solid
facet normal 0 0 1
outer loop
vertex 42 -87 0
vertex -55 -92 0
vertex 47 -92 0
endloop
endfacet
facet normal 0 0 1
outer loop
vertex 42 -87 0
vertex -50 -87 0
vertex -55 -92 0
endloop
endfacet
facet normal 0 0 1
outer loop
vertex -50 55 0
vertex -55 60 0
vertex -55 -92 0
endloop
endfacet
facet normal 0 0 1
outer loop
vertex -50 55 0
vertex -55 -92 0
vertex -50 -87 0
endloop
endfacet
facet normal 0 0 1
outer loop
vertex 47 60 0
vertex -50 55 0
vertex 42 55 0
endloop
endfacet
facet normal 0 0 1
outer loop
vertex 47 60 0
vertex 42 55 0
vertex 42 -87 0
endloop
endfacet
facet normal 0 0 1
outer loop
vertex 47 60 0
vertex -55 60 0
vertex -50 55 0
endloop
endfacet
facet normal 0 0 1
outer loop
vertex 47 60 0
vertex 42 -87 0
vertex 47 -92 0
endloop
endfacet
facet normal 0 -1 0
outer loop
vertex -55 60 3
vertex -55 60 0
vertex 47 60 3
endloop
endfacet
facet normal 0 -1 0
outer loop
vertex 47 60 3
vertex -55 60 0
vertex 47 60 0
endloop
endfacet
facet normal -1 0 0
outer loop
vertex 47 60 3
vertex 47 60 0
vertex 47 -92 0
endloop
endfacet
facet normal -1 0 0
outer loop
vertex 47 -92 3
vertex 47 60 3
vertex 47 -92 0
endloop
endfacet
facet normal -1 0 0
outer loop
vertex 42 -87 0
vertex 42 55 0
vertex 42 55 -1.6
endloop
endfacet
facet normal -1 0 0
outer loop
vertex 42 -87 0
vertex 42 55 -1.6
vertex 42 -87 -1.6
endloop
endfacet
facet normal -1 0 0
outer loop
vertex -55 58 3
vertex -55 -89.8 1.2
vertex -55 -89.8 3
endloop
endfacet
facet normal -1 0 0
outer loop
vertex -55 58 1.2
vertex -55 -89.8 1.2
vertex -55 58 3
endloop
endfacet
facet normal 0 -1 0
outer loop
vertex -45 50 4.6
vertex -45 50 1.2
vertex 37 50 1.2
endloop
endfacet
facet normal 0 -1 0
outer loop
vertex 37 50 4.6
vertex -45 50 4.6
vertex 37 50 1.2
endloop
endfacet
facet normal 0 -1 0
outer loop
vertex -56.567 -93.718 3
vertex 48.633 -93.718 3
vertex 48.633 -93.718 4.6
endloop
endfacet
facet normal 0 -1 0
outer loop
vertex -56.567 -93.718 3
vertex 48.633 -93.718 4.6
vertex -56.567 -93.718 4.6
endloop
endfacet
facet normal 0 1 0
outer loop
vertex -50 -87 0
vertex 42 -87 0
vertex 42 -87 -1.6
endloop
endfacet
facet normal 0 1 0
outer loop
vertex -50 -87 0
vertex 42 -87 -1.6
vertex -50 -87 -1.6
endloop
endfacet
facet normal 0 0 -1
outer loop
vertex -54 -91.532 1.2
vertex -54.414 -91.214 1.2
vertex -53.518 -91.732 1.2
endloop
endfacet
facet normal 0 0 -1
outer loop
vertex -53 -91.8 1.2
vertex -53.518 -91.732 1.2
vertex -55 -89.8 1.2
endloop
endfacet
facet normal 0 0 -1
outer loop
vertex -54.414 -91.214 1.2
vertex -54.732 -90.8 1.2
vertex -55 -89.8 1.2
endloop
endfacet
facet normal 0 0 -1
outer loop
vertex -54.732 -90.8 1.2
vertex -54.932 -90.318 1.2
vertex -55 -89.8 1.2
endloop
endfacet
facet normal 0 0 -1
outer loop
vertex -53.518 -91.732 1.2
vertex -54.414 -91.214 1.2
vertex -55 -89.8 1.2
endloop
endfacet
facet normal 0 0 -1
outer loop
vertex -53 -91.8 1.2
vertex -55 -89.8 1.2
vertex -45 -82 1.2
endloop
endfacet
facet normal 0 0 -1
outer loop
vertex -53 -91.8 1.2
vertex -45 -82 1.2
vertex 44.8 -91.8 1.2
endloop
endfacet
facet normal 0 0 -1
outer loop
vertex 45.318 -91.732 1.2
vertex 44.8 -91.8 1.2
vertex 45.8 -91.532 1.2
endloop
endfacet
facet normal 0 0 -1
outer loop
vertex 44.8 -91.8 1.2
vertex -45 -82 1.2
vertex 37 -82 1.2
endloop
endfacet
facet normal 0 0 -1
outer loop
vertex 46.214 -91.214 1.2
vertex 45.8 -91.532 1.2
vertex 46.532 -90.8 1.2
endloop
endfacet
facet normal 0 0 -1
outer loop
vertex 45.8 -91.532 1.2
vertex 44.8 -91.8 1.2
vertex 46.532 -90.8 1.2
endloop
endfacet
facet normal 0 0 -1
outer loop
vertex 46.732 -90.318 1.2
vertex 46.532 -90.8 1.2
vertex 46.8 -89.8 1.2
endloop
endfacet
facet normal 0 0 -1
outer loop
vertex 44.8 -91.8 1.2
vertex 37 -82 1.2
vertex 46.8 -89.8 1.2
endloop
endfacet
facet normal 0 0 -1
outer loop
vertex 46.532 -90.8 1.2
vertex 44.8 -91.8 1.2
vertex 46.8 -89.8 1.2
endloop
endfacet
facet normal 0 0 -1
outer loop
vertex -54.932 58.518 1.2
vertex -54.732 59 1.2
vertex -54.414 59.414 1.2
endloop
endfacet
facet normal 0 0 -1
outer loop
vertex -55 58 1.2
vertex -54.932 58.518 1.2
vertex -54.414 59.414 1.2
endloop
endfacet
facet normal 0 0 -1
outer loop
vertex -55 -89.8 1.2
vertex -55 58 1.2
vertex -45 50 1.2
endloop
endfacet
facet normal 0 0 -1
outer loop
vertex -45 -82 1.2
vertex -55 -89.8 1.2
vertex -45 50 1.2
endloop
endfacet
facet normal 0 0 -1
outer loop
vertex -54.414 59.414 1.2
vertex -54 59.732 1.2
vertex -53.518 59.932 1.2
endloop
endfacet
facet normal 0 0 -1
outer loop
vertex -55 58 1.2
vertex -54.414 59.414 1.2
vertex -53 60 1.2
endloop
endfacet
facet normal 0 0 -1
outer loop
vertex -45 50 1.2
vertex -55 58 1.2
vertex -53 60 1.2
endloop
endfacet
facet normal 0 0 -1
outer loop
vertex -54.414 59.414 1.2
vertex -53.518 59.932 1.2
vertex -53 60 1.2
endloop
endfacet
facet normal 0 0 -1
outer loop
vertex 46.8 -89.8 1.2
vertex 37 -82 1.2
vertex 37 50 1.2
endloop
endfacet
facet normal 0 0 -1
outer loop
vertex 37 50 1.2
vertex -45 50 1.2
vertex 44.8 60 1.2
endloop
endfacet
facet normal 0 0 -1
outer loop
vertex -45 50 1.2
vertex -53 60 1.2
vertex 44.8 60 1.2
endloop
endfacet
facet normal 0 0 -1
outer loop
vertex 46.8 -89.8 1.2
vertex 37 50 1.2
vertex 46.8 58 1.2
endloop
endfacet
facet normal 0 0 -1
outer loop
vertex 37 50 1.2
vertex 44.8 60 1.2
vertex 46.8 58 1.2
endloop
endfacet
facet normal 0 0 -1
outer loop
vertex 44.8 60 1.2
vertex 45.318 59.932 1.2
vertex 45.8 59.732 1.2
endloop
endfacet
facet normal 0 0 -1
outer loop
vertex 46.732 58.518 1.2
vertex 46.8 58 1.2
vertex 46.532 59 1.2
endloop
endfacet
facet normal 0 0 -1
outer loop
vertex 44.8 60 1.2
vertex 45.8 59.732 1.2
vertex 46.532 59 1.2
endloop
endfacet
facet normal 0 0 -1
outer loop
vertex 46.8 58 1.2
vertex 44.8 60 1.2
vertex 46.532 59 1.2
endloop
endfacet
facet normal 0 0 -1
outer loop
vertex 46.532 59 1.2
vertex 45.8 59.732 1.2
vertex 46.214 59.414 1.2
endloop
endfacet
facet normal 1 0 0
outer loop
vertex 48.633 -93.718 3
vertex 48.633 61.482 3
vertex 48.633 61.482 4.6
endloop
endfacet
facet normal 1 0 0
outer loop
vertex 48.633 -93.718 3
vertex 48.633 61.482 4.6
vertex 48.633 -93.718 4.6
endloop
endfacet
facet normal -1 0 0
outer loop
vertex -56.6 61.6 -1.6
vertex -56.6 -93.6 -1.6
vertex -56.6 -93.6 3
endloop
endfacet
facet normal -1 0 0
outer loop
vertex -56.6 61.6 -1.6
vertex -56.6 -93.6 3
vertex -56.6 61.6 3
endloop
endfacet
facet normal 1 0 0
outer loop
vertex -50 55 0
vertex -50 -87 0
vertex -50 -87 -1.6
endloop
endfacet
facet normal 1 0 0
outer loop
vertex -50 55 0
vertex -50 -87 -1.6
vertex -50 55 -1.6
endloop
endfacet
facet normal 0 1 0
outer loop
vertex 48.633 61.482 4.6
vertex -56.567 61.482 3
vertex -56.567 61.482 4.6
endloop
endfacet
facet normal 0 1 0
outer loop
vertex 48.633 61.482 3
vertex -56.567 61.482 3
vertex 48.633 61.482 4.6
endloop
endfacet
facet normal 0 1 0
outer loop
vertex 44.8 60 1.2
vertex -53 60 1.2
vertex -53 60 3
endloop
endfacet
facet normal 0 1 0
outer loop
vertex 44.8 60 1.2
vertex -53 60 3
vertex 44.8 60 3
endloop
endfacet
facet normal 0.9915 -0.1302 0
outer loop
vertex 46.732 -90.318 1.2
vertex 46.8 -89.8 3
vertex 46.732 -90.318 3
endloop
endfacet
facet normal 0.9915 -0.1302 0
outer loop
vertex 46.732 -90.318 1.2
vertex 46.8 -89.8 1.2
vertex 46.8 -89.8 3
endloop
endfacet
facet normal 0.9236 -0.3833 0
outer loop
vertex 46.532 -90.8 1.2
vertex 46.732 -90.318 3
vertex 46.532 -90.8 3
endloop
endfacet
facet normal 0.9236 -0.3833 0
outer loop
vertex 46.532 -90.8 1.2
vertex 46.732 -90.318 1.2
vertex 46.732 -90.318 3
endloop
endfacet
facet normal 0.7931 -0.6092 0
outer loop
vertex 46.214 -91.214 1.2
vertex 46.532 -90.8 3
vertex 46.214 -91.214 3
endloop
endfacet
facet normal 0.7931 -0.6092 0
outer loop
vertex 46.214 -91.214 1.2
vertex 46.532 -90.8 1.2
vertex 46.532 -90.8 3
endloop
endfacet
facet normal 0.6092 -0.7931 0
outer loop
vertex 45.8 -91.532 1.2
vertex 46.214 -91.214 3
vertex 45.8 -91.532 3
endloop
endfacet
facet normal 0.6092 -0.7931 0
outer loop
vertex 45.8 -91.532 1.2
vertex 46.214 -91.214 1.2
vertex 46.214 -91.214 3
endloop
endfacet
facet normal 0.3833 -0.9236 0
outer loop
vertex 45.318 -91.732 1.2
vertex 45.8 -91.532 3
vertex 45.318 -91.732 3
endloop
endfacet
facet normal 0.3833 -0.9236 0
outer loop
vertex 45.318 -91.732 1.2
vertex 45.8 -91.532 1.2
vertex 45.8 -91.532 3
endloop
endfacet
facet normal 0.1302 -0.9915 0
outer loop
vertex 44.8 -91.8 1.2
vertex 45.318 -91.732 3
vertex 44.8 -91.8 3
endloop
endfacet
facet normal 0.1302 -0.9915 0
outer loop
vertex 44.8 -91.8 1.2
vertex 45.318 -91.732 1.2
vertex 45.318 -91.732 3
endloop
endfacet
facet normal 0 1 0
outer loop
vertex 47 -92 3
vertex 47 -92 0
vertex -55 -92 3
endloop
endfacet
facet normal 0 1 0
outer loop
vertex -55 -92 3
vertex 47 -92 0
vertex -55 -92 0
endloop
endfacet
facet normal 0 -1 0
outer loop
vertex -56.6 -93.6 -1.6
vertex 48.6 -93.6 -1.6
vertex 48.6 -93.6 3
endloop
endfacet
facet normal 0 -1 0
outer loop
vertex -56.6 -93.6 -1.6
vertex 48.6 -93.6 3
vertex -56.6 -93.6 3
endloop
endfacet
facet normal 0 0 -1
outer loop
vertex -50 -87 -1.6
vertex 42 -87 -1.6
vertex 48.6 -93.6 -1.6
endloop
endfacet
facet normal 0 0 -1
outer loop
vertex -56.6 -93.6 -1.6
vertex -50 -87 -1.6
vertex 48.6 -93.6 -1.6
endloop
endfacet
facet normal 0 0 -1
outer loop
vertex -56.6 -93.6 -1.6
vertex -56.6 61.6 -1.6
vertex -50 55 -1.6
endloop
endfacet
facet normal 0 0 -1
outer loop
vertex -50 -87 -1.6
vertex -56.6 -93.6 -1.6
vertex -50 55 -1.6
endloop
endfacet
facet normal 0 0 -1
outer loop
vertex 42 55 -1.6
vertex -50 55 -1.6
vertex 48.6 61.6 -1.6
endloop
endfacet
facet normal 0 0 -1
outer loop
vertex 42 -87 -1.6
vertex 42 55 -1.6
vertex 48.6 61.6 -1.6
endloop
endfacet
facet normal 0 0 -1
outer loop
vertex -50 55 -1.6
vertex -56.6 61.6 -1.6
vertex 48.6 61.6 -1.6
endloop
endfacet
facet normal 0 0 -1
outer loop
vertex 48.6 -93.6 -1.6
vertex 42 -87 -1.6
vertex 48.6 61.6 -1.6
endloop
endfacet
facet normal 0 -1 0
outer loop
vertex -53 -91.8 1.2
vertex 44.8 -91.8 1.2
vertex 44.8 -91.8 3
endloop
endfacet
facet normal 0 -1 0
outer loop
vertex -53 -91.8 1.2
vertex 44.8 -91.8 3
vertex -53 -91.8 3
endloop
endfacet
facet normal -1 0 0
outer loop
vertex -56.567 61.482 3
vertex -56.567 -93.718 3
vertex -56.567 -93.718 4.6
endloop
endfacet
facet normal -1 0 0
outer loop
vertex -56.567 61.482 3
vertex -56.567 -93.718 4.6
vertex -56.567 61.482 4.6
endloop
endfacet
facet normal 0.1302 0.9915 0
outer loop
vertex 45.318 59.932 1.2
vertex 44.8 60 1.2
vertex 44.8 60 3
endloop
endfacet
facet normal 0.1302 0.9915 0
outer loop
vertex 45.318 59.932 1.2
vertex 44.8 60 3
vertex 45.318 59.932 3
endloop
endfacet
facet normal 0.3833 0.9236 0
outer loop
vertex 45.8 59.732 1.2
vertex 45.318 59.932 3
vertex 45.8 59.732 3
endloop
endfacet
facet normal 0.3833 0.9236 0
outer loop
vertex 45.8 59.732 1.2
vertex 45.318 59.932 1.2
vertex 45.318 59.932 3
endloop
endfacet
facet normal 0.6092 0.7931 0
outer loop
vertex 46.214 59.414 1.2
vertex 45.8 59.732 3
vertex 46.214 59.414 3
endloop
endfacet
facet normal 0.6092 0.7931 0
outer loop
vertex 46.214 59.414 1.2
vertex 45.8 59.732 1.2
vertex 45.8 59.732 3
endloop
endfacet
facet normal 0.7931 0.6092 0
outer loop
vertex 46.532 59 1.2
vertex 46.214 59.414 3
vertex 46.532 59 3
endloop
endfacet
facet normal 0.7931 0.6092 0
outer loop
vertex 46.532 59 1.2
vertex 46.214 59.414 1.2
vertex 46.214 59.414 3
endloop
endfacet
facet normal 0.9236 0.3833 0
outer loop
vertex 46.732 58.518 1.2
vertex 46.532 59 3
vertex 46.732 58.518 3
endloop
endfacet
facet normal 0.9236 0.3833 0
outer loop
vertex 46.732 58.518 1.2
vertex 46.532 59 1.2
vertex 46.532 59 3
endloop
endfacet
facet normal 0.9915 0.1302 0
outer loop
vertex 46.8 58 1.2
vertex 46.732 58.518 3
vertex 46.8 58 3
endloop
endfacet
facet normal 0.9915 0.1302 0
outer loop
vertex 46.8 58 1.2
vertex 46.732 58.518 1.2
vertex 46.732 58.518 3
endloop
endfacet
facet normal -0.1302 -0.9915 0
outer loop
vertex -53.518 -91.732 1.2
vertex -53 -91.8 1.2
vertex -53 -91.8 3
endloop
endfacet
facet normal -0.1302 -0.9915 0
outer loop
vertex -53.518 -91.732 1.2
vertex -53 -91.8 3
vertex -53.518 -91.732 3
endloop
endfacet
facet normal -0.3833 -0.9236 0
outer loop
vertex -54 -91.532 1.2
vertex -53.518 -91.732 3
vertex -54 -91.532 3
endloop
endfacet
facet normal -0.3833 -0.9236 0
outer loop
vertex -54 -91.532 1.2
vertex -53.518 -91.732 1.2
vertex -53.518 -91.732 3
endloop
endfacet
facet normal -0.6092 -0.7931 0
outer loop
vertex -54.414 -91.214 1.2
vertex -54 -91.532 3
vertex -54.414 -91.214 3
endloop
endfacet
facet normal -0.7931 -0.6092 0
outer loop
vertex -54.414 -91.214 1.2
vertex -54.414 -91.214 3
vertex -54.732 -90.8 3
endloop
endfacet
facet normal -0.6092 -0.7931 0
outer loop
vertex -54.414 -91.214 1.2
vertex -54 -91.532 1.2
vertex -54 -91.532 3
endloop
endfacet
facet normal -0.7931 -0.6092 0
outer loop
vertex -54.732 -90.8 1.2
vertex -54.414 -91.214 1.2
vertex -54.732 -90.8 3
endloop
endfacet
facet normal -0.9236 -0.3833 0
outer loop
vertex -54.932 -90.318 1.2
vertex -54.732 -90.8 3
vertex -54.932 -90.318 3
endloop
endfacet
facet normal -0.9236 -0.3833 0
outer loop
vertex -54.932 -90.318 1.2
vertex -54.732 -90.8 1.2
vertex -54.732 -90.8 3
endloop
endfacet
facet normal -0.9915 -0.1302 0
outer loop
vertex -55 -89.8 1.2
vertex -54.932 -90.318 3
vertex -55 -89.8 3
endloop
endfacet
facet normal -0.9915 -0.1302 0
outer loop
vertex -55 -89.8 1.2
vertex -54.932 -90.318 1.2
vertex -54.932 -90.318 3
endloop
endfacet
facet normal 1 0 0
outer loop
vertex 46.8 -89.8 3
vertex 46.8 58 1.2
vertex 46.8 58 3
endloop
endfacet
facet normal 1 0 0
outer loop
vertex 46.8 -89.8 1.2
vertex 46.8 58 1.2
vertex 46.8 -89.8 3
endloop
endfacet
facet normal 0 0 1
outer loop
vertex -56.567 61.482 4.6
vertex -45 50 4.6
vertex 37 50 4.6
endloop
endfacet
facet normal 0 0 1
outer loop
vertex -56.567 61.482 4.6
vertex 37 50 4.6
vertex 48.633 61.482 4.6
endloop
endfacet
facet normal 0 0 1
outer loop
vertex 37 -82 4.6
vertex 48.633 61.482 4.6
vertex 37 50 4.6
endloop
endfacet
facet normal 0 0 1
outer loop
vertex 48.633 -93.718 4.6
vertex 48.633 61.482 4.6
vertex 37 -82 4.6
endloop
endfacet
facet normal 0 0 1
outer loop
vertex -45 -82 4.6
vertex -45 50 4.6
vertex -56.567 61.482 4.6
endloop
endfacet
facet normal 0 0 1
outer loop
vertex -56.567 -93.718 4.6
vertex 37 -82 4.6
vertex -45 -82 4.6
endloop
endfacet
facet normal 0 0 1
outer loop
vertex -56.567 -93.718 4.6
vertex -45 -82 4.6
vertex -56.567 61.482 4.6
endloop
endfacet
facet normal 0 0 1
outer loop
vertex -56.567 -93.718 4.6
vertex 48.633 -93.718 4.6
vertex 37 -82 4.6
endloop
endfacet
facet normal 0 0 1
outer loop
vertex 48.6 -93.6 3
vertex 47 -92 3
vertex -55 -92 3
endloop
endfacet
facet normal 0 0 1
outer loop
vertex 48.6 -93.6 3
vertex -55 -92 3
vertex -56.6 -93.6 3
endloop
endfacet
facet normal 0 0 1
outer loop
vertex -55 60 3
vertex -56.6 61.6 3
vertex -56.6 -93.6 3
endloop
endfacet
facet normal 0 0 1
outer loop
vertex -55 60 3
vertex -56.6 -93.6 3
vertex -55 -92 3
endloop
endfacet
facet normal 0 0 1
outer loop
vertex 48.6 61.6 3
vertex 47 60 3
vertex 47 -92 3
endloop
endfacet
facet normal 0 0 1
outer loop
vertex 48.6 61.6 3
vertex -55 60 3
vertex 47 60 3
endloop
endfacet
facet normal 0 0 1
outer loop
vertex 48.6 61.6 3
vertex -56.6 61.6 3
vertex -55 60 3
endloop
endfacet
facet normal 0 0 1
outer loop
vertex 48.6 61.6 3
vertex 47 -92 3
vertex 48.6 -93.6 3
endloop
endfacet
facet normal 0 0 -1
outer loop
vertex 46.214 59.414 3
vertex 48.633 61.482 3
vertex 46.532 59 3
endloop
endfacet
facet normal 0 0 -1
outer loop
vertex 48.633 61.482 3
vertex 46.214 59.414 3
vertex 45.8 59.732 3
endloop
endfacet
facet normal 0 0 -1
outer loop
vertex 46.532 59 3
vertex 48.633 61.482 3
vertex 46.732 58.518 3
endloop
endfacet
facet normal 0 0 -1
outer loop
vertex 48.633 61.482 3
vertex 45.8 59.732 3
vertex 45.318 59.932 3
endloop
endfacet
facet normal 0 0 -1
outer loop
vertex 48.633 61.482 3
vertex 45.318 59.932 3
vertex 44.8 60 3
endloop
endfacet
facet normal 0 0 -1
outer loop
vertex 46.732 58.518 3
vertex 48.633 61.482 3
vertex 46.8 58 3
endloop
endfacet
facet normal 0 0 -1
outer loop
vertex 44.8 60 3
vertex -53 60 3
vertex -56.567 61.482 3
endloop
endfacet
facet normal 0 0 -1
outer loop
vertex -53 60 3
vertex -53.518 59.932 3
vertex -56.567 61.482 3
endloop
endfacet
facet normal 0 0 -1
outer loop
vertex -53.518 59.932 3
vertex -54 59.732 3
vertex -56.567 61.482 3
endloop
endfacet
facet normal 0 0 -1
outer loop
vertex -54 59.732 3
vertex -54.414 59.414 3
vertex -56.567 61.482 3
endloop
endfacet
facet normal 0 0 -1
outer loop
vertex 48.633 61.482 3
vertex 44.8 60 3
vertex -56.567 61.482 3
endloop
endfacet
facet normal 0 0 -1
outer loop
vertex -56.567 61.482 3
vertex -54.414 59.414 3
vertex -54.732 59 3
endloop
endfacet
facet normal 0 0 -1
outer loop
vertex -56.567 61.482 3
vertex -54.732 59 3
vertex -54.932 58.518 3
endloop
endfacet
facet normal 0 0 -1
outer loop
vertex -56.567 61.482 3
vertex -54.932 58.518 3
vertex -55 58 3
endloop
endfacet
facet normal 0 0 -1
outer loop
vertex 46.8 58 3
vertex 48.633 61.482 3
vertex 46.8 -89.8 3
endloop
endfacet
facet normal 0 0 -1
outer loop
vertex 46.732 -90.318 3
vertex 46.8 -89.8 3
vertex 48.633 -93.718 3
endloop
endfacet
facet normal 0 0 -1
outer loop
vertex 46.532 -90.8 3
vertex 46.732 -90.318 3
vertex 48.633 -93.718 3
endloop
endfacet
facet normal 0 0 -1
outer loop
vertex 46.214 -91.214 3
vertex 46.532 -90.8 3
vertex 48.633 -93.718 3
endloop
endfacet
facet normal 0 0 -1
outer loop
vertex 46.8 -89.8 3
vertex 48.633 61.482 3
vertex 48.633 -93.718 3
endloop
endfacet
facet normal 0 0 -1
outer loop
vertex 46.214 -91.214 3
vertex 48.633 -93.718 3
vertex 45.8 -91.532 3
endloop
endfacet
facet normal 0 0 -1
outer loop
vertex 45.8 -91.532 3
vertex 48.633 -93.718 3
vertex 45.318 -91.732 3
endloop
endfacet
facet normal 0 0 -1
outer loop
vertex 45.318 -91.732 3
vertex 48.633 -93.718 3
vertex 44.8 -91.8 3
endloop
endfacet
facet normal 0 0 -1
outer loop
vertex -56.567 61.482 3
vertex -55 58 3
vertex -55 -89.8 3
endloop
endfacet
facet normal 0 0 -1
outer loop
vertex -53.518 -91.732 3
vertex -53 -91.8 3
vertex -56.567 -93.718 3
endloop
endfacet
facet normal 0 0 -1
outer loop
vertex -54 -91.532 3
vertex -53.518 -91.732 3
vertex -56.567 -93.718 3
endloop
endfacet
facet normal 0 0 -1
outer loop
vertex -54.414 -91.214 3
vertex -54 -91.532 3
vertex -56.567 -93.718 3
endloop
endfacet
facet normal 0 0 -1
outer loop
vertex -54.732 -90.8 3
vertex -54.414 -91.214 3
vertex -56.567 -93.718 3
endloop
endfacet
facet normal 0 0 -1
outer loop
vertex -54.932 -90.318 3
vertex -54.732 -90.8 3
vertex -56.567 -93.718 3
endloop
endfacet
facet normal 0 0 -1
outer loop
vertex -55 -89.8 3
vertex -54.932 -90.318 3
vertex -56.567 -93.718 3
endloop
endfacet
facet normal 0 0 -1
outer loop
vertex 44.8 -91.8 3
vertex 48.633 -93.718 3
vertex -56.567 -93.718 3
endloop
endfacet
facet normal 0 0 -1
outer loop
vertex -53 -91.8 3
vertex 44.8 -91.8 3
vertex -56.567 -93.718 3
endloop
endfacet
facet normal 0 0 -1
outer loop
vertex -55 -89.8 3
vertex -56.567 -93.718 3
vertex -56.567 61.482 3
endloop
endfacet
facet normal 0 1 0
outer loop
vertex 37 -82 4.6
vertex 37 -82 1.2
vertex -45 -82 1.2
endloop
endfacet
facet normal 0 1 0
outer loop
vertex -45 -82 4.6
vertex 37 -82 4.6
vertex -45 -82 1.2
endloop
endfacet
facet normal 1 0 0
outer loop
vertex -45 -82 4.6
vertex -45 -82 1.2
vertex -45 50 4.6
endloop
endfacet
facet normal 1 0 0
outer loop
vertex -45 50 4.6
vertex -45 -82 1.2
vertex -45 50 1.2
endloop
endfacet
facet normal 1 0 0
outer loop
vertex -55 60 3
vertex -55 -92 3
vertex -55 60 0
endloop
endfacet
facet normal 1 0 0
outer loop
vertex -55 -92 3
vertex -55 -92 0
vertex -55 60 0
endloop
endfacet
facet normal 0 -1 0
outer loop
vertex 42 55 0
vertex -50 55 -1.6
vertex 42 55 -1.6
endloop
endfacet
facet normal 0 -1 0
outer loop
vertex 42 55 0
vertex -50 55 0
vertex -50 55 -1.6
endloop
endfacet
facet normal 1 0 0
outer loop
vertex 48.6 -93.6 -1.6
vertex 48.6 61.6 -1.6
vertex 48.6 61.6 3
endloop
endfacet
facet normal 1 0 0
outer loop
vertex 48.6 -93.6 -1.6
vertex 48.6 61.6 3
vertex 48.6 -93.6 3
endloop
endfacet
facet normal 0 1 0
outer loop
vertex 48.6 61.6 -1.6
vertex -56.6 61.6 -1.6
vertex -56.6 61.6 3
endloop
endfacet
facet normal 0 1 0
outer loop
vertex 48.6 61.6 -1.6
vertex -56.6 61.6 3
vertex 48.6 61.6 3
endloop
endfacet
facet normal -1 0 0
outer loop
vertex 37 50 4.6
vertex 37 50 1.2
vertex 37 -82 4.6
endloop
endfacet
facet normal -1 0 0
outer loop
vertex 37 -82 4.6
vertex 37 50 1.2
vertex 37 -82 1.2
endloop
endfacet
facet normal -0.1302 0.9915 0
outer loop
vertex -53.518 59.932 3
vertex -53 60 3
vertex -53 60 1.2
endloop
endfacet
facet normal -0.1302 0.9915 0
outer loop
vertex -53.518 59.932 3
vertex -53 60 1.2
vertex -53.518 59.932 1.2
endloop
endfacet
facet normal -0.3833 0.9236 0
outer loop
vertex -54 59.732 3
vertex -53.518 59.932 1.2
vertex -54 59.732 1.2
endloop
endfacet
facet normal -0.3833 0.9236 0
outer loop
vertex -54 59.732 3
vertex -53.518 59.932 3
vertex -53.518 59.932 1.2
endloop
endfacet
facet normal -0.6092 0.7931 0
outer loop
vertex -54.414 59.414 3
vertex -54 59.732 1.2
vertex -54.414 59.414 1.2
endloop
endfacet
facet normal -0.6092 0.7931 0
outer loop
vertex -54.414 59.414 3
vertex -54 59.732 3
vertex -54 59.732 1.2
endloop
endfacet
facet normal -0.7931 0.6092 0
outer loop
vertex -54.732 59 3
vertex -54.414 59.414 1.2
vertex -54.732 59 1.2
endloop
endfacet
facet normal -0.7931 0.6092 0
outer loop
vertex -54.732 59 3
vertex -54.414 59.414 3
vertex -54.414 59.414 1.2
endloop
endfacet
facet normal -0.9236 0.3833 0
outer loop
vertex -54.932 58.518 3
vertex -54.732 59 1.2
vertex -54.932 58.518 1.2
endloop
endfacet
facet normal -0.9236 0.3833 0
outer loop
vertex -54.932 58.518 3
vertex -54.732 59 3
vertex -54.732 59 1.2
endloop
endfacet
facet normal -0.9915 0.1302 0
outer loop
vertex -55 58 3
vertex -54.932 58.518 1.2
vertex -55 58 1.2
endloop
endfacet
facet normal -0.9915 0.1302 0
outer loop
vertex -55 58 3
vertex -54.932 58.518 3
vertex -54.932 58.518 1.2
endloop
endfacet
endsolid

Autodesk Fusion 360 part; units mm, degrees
sketch "Sketch1" plane through (0, 0, 0) normal (0, 0, 1) x (1, 0, 0)
  line L0 (-55, 60) -> (47, 60)
  line L1 (47, 60) -> (47, -92)
  line L2 (47, -92) -> (-55, -92)
  line L3 (-55, -92) -> (-55, 60)
  line L4 (-50, 55) -> (42, 55)
  line L5 (42, 55) -> (42, -87)
  line L6 (42, -87) -> (-50, -87)
  line L7 (-50, -87) -> (-50, 55)
  line L8 (-56.6, 61.6) -> (48.6, 61.6)
  line L9 (48.6, 61.6) -> (48.6, -93.6)
  line L10 (48.6, -93.6) -> (-56.6, -93.6)
  line L11 (-56.6, -93.6) -> (-56.6, 61.6)
  dimension "d1" = 102
  dimension "d2" = 152
  dimension "d3" = 105.2
  dimension "d4" = 155.2
  dimension "d5" = 1.6
  dimension "d6" = 1.6
extrude "Extrude1" add sketch "Sketch1" against normal blind 1.6 contours L0 L1 L2 L3 | L8 L9 L10 L11 makes body 1 in component "Component"
extrude "Extrude2" add sketch "Sketch1" along normal blind 3 contours L8 L9 L10 L11 bodies 1 in component "Component"
sketch "Sketch2" plane through (0, 0, 0) normal (0, 0, 1) x (1, 0, 0)
  line L0 (-55, 60) -> (46.8, 60)
  line L1 (46.8, 60) -> (46.8, -91.8)
  line L2 (46.8, -91.8) -> (-55, -91.8)
  line L3 (-55, -91.8) -> (-55, 60)
  line L4 (-45, 50) -> (37, 50)
  line L5 (37, 50) -> (37, -82)
  line L6 (37, -82) -> (-45, -82)
  line L7 (-45, -82) -> (-45, 50)
  dimension "d11" = 101.8
  dimension "d12" = 151.8
  dimension "d13" = 82
  dimension "d14" = 132
extrude "Extrude1'" add sketch "Sketch2" along normal blind 1.6 separate body makes body 2 in component "Component'"
move_face "MoveFace1" by (0, 0, 1.4) 1 faces at (-51.6667, 6.0667, 1.6) on bodies 2 in component "Component'"
fillet "Fillet1" radius 2 4 edges at (-55, 60, 1.5) (46.8, 60, 1.5) (46.8, -91.8, 1.5) (-55, -91.8, 1.5) on bodies 2 in component "Component'"
sketch "Sketch1 (2)" plane through (0, 0, 3) normal (0, 0, 1) x (-1, 0, 0) in component "Component'"
  arc A0 (55, 89.8) -> (53, 91.8) centre (53, 89.8) ccw
  line L0 (53, 91.8) -> (-44.8, 91.8)
  arc A1 (-44.8, 91.8) -> (-46.8, 89.8) centre (-44.8, 89.8) ccw
  line L1 (-46.8, 89.8) -> (-46.8, -58)
  arc A2 (-46.8, -58) -> (-44.8, -60) centre (-44.8, -58) ccw
  line L2 (-44.8, -60) -> (53, -60)
  arc A3 (53, -60) -> (55, -58) centre (53, -58) ccw
  line L3 (55, -58) -> (55, 89.8)
  line L4 (-37, 82) -> (45, 82)
  line L5 (45, 82) -> (45, -50)
  line L6 (45, -50) -> (-37, -50)
  line L7 (-37, -50) -> (-37, 82)
  line L8 (56.5668, -61.4819) -> (-48.6332, -61.4819)
  line L9 (-48.6332, -61.4819) -> (-48.6332, 93.7181)
  line L10 (-48.6332, 93.7181) -> (56.5668, 93.7181)
  line L11 (56.5668, 93.7181) -> (56.5668, -61.4819)
  dimension "d19" = 105.2
  dimension "d20" = 155.2
extrude "Extrude2'" add sketch "Sketch1 (2)" along normal blind 1.6 contours A0 L0 A1 L1 A2 L2 A3 L3 | L8 L9 L10 L11 bodies 2 in component "Component'"
move_face "MoveFace2" by (0, 0, 1.2) 1 faces at (-51.6667, 6.0667, 0) on bodies 2 in component "Component'"
component "Component" placed x (1, 0, 0) y (0, 1, 0) z (0, 0, 1) at (0, 0, 0)
component "Component'" placed x (1, 0, 0) y (0, 1, 0) z (0, 0, 1) at (0, 0, 0)
